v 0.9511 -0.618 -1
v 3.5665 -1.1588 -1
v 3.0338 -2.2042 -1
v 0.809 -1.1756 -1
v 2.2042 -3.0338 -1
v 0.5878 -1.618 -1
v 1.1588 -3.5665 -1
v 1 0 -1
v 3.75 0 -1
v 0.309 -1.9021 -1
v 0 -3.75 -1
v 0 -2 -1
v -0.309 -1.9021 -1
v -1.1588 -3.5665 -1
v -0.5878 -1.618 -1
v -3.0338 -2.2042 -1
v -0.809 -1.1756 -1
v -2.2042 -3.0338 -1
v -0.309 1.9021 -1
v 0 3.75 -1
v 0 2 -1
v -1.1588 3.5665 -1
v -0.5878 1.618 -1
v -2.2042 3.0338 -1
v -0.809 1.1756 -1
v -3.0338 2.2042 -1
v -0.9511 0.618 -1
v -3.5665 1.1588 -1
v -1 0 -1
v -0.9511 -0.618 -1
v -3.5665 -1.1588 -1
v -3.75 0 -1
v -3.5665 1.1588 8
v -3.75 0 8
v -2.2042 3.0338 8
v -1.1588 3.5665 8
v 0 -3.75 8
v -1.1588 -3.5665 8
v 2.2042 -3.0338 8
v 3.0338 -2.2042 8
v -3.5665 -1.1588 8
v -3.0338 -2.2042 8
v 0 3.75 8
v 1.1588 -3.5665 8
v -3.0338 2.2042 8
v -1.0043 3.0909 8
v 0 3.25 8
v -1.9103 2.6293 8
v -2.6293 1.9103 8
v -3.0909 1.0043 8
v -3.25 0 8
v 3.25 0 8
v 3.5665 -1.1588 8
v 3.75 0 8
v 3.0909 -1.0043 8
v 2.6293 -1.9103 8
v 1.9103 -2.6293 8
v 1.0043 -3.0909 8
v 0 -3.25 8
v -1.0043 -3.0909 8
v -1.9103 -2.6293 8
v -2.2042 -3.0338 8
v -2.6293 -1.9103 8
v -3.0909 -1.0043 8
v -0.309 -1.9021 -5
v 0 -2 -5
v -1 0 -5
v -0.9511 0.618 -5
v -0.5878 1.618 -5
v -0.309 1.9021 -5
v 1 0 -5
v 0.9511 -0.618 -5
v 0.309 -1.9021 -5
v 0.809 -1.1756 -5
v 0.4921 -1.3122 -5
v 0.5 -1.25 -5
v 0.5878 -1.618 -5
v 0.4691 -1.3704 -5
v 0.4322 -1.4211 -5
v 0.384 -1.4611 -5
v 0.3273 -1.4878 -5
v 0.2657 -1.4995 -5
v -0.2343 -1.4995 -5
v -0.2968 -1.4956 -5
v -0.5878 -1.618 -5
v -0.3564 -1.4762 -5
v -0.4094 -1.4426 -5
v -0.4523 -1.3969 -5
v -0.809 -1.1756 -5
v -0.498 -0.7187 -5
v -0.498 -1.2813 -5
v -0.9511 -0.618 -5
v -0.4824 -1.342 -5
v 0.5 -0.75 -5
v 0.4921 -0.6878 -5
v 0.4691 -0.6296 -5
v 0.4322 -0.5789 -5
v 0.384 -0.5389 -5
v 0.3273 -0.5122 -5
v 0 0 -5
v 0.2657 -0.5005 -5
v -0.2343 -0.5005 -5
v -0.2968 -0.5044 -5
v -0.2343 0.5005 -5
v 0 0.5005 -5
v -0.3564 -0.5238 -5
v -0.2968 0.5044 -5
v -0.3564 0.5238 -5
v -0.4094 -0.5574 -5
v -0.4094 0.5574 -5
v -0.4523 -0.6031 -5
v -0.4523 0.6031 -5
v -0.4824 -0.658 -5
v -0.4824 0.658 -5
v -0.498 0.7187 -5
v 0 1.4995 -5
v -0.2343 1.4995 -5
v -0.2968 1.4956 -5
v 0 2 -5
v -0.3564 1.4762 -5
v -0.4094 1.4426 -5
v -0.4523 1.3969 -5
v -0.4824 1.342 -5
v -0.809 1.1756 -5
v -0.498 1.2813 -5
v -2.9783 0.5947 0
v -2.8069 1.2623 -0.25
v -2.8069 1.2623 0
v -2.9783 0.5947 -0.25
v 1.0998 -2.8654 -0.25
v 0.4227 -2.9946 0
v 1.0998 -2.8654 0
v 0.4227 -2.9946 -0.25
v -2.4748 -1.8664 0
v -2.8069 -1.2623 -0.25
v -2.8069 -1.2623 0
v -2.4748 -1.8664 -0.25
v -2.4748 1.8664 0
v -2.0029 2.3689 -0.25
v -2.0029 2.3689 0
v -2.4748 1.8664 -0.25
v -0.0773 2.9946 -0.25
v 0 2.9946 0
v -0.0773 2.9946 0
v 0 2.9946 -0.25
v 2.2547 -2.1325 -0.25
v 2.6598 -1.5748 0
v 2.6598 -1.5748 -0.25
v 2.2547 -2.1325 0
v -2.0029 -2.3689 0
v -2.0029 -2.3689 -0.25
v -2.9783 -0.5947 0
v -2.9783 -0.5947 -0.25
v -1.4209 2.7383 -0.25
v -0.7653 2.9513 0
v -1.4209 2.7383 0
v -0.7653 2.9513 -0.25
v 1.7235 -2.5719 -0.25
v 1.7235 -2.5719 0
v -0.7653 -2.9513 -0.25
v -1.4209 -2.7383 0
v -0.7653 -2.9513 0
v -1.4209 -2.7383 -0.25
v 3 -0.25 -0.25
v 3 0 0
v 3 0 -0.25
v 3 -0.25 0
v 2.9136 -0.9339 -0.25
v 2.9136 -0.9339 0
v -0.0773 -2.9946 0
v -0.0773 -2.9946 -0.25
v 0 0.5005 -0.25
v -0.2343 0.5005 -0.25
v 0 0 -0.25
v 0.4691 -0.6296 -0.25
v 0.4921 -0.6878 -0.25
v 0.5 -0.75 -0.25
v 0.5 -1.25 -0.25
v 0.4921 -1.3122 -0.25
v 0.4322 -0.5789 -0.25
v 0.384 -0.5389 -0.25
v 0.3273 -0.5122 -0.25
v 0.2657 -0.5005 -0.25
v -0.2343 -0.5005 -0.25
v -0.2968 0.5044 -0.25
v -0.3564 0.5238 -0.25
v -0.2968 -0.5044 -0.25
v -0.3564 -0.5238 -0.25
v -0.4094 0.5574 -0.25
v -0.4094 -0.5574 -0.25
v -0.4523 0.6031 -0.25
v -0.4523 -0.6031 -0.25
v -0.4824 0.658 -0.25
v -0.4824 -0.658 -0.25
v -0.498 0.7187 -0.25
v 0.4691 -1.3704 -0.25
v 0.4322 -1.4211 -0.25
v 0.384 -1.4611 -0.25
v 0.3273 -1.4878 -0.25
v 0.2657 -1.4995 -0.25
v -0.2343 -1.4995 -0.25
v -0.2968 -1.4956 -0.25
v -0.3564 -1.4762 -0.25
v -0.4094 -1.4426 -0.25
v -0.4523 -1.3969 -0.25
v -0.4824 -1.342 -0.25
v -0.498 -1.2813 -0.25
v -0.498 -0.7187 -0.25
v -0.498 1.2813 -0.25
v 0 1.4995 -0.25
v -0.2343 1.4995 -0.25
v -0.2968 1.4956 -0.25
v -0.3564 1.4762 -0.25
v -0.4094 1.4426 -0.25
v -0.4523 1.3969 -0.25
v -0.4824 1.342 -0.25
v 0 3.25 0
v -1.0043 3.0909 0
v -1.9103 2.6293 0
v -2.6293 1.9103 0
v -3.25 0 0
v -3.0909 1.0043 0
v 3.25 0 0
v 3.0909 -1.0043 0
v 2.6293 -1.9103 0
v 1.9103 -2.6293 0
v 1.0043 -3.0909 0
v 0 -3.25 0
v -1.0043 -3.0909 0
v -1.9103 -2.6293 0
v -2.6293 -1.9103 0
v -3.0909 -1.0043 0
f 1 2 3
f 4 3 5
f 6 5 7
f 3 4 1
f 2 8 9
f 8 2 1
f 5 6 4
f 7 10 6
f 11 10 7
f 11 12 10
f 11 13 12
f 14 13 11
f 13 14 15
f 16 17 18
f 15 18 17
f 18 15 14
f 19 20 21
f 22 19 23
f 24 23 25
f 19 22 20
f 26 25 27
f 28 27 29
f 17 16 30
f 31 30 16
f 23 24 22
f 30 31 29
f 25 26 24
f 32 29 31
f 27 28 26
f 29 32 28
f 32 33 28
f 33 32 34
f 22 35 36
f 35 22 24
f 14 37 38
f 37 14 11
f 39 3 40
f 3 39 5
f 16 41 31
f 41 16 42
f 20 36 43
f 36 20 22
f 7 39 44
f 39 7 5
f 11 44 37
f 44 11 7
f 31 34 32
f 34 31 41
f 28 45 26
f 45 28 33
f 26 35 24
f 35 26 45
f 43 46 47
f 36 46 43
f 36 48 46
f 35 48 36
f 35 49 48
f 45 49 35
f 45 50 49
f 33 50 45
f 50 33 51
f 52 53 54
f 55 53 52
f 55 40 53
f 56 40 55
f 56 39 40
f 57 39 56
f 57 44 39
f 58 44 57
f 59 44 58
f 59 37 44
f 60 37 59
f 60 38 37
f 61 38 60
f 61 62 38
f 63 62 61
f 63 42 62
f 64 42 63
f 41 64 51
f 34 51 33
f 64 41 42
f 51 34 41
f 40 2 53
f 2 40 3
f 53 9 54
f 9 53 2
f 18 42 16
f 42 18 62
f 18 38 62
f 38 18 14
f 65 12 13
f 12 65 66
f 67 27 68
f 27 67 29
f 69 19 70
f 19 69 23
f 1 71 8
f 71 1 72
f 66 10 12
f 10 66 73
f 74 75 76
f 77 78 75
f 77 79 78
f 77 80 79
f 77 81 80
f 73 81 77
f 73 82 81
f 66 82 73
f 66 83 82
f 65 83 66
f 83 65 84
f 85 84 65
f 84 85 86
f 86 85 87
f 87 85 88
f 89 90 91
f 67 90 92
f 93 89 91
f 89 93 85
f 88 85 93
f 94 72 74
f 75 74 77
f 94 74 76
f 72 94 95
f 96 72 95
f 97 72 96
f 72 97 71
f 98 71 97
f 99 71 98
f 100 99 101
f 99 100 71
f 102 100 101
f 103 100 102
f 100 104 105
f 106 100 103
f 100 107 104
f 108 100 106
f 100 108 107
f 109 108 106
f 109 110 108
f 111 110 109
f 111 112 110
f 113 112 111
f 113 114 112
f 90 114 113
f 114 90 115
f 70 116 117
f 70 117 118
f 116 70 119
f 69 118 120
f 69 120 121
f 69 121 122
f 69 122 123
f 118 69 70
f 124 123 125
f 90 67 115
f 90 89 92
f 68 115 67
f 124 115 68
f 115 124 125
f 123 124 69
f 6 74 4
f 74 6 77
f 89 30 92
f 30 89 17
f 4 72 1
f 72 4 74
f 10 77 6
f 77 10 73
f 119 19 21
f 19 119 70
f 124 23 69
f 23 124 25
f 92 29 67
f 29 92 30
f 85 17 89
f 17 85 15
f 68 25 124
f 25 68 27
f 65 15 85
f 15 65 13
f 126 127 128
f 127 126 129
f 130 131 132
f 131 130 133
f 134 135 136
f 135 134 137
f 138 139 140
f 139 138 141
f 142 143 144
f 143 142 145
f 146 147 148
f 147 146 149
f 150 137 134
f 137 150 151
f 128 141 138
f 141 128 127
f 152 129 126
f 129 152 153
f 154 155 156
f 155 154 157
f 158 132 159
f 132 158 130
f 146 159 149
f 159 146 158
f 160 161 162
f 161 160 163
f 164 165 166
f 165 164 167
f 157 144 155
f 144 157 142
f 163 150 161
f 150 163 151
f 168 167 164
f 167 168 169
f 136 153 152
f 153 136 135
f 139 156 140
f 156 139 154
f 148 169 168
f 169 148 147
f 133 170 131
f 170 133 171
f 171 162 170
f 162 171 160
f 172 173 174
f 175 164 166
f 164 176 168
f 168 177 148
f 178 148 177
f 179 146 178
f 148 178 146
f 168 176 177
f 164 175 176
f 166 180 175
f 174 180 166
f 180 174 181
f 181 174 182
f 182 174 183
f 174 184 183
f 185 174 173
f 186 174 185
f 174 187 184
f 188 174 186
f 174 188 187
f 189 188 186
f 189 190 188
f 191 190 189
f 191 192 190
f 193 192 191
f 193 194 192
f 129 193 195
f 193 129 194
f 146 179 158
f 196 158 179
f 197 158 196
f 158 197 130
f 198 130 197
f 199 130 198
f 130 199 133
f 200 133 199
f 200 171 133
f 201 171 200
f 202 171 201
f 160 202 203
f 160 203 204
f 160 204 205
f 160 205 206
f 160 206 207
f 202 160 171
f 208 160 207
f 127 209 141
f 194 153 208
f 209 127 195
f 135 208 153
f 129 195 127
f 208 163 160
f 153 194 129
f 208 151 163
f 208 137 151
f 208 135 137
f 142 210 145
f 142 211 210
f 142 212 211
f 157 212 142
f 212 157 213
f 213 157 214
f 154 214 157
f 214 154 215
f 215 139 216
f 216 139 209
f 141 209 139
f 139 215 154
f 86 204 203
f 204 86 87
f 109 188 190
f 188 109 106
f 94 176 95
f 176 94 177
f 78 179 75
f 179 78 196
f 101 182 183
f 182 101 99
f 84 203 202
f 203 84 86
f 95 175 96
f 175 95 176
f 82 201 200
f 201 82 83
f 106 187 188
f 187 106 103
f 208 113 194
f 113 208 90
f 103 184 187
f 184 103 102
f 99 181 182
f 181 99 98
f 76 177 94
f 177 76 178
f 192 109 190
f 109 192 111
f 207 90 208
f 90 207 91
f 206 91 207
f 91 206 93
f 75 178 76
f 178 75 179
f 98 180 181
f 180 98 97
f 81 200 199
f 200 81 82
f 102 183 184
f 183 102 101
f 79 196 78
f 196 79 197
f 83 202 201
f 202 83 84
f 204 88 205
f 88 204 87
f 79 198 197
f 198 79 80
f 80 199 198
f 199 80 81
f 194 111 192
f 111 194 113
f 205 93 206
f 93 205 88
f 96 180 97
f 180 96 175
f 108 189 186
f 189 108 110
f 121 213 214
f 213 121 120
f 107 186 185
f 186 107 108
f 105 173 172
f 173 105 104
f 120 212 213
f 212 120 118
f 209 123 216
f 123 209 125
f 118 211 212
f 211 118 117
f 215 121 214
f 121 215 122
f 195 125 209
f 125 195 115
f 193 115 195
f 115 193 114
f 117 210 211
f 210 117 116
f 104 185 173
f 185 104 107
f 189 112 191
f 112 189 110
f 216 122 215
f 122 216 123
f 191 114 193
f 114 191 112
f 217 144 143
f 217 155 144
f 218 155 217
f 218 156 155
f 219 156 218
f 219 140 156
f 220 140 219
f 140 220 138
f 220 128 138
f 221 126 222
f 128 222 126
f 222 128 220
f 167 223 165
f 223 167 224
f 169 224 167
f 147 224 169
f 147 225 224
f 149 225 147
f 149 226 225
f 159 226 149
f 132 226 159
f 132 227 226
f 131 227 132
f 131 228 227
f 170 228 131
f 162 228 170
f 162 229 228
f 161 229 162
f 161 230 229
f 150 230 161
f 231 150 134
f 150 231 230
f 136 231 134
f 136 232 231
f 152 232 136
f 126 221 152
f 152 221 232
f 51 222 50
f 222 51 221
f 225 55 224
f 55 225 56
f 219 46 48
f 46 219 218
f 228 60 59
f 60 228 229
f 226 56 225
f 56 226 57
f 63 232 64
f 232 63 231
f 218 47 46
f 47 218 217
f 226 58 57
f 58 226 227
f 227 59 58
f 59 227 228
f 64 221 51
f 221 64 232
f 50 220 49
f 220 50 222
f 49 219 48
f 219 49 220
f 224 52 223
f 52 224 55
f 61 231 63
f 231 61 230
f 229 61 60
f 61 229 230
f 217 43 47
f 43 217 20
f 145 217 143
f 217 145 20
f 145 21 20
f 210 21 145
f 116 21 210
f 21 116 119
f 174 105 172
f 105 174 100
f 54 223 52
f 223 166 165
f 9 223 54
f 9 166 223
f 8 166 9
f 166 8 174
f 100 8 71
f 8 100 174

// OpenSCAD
// file: libraries/LED.scad
// Courtesy of http://www.thingiverse.com/thing:38396

//LED Dimensions
led_d=5; //LED Diameter
led_h=8; //LED Height
led_fh=1; //LED FLange Thickness
led_fd=5.5; //LED Flange Diameter
led_wire_d=.5; //Wire Diameter
led_wire_h=10; //Wire Height
led_wire_da=2; // THe distance between the Wires

module led(){
  translate([0,0,led_fh])
    cylinder(h=led_h-(led_d/2)-led_fh,
	     r1=led_d/2,
	     r2=led_d/2,
	     $fn=25);
  translate([0,0,led_h-(led_d/2)])
    sphere(led_d/2,  $fn=25);
  cylinder(led_fh,led_fd/2,led_fd/2, $fn=25);
  translate([0,led_wire_da/2,-led_wire_h])cylinder(led_wire_h,led_wire_d/2,led_wire_d/2, $fn=25);
  translate([0,led_wire_da/-2,-led_wire_h])cylinder(led_wire_h,led_wire_d/2,led_wire_d/2, $fn=25);
}
// main file
include <libraries/LED.scad>;

$fn = 20;

module led_holder() {
  outer_shell_thickness = 1;
  inner_shell_diameter = led_fd + 1;
  upper_shell_top = led_h + 1;
  upper_shell_bottom = -1;
  lower_shell_bottom = -led_wire_h / 2;
  lower_shell_thickness = 1;
  minkowski_shell = 0.5;

  difference() {
    union() {
      translate([0, 0, upper_shell_bottom])
	cylinder(r=led_fd/2 + outer_shell_thickness, h=upper_shell_top);
      scale([0.5, 1, 1])
	translate([0, 0, lower_shell_bottom])
	cylinder(r=led_wire_da, h=upper_shell_bottom - lower_shell_bottom);
    }
    render() {
      minkowski() {
	led();
	cube(minkowski_shell, center=true);
      }
    }
    cylinder(r=inner_shell_diameter / 2, h=upper_shell_top);
  }
}

difference() {
  union() {
    led_holder();
    %color("blue") led();
  }
  translate([0, 0, -20])
    cube(40);
}
